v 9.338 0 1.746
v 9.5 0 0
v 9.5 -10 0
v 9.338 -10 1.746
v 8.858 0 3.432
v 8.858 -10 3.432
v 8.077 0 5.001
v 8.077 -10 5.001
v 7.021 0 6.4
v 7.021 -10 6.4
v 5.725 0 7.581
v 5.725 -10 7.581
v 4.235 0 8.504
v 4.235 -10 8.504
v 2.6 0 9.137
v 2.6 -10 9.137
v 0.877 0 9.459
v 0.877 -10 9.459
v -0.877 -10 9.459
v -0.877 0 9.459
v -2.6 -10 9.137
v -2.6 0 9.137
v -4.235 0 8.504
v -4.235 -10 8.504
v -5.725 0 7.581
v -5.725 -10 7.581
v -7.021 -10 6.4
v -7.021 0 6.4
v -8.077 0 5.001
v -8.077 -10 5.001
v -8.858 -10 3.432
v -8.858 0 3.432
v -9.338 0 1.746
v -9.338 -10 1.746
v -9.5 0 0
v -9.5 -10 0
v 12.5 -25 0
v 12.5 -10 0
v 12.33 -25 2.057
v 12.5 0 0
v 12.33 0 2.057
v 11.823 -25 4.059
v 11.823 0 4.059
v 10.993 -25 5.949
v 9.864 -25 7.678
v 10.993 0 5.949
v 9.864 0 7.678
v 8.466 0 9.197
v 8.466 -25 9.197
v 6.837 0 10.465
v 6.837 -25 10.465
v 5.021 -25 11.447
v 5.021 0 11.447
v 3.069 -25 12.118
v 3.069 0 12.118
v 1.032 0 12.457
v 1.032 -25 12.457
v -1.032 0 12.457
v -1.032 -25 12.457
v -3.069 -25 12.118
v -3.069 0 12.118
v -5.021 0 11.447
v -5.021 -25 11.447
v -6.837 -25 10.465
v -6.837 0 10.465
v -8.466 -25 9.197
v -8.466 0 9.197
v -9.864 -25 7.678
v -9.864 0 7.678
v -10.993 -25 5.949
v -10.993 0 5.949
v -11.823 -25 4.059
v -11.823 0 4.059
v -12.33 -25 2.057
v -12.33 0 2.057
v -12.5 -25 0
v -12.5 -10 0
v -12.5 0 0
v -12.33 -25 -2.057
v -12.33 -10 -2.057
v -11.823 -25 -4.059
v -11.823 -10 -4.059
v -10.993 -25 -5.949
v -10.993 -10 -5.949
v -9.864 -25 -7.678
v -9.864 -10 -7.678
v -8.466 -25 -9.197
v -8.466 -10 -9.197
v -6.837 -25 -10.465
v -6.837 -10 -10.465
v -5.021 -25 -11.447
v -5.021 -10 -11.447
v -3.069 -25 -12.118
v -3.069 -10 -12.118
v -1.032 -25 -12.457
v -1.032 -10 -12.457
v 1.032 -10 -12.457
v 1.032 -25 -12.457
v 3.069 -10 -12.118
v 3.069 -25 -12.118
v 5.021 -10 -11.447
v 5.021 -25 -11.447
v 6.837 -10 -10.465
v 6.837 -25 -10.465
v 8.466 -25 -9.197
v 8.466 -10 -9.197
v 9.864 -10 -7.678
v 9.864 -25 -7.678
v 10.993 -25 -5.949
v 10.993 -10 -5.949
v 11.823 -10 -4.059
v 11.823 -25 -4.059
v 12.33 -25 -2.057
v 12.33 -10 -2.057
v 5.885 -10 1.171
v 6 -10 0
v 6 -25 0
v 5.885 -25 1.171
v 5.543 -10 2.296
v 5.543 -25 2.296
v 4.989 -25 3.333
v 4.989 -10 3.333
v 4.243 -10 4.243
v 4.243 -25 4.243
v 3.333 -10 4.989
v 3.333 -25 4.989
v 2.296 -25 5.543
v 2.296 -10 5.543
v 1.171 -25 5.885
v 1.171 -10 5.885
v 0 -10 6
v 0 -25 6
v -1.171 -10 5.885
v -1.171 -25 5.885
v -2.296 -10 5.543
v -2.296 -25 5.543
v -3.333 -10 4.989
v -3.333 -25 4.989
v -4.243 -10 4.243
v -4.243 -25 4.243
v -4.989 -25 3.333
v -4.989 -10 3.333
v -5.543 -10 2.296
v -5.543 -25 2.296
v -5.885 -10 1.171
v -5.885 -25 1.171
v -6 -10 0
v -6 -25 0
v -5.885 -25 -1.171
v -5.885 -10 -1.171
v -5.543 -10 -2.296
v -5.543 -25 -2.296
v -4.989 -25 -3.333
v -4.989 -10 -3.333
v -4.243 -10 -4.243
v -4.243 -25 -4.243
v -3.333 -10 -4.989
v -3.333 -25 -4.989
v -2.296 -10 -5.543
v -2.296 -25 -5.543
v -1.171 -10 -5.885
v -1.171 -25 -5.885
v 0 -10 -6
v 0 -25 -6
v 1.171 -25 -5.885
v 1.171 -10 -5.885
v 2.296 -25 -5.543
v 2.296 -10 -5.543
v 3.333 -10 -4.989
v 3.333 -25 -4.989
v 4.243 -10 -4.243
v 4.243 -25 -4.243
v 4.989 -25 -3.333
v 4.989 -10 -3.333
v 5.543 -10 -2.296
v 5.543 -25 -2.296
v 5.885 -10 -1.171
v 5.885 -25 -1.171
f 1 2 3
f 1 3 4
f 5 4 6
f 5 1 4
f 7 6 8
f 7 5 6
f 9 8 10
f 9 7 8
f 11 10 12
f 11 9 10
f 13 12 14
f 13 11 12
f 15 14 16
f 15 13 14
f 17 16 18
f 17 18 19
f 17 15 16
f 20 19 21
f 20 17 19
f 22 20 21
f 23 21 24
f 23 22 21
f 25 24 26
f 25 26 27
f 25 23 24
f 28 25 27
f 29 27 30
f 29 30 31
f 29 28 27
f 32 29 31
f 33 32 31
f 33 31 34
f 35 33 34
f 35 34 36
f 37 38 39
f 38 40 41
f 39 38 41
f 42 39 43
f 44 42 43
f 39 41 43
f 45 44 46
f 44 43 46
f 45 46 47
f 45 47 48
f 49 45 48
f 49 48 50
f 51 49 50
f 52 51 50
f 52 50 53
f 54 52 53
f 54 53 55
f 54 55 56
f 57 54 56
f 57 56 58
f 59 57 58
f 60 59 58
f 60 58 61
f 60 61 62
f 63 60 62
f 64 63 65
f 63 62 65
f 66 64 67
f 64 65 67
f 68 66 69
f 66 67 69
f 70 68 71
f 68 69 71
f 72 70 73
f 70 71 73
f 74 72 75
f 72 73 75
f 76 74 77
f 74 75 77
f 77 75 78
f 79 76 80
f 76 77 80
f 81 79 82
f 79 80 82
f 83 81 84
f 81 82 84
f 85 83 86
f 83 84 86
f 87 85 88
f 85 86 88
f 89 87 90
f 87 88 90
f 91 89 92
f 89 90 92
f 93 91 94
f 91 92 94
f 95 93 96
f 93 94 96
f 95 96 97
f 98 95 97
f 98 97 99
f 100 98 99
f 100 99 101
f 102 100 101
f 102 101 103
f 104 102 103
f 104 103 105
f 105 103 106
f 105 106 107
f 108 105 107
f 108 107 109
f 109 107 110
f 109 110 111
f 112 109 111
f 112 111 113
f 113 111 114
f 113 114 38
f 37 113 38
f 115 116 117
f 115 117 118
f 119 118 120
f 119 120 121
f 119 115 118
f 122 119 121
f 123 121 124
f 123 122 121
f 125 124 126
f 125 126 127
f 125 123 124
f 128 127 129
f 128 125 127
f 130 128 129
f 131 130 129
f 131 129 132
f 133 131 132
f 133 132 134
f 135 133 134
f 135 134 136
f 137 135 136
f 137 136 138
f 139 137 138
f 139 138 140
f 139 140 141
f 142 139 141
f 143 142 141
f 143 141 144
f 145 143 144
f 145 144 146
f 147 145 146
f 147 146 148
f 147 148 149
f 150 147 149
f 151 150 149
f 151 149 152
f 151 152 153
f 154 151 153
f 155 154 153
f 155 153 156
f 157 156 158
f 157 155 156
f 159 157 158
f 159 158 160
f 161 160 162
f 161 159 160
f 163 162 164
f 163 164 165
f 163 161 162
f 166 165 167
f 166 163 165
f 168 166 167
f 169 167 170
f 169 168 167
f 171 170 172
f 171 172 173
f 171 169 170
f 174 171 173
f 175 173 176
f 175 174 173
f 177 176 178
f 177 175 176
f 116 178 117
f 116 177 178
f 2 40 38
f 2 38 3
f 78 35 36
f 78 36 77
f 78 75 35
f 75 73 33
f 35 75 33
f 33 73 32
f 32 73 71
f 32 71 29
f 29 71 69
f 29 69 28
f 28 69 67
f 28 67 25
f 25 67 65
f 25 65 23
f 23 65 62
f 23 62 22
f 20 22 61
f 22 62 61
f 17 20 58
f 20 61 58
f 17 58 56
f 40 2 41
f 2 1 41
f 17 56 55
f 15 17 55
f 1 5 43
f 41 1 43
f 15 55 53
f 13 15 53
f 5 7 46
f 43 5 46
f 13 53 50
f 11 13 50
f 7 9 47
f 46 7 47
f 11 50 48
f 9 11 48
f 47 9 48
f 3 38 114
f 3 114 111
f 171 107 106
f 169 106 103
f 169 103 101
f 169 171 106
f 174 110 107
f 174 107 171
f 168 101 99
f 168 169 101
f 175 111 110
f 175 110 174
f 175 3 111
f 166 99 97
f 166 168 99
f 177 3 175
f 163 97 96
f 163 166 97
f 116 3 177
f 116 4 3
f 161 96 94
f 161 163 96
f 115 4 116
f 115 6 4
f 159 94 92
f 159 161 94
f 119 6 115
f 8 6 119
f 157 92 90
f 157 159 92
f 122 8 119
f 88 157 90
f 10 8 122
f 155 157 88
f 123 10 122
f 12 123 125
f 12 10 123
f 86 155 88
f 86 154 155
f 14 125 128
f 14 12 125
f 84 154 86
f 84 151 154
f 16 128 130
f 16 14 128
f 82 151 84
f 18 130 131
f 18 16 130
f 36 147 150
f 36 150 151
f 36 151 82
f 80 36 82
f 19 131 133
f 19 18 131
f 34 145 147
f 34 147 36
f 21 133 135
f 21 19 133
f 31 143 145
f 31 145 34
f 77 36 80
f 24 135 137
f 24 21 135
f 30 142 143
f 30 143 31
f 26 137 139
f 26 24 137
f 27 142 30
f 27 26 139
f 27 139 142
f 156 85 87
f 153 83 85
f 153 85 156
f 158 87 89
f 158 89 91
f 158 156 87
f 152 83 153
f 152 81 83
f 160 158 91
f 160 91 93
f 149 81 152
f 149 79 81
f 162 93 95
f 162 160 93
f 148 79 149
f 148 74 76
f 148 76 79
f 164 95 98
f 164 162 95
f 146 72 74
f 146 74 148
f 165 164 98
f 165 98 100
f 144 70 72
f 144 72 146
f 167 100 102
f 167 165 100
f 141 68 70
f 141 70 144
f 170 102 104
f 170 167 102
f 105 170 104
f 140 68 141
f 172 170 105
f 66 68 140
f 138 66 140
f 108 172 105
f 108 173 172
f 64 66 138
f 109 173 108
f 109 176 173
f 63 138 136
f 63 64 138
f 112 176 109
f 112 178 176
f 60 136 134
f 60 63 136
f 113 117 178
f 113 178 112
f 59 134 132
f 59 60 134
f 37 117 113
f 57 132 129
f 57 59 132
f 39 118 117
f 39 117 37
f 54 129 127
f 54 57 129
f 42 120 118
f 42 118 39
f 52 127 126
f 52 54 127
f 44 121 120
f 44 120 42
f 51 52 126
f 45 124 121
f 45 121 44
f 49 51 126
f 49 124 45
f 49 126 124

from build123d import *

# Parameters (mm, degrees)
F0_R     = 12.5
F0_R_2   = 6
F1_DEPTH = 25
F2_R     = 9.5
F3_DEPTH = 10
F4_W     = 32.378687
F4_H     = 14.496426
F5_DEPTH = 10


with BuildPart() as f1:
    # F0 (on Front) → F1 (new body)
    with BuildSketch(Plane.XZ):
        Circle(F0_R)
        Circle(F0_R_2, mode=Mode.SUBTRACT)
    extrude(amount=F1_DEPTH)

    # F2 (on Front) → F3 (cut)
    with BuildSketch(Plane.XZ):
        Circle(F2_R)
    extrude(amount=F3_DEPTH, mode=Mode.SUBTRACT)

    # F4 (on face) → F5 (cut)
    with BuildSketch(Plane(origin=(0, 0, 0), x_dir=(-1, 0, 0), z_dir=(0, 1, 0))):
        with Locations((-0.849587, -7.248213)):
            Rectangle(F4_W, F4_H)
    extrude(amount=-F5_DEPTH, mode=Mode.SUBTRACT)


solid = f1.part
